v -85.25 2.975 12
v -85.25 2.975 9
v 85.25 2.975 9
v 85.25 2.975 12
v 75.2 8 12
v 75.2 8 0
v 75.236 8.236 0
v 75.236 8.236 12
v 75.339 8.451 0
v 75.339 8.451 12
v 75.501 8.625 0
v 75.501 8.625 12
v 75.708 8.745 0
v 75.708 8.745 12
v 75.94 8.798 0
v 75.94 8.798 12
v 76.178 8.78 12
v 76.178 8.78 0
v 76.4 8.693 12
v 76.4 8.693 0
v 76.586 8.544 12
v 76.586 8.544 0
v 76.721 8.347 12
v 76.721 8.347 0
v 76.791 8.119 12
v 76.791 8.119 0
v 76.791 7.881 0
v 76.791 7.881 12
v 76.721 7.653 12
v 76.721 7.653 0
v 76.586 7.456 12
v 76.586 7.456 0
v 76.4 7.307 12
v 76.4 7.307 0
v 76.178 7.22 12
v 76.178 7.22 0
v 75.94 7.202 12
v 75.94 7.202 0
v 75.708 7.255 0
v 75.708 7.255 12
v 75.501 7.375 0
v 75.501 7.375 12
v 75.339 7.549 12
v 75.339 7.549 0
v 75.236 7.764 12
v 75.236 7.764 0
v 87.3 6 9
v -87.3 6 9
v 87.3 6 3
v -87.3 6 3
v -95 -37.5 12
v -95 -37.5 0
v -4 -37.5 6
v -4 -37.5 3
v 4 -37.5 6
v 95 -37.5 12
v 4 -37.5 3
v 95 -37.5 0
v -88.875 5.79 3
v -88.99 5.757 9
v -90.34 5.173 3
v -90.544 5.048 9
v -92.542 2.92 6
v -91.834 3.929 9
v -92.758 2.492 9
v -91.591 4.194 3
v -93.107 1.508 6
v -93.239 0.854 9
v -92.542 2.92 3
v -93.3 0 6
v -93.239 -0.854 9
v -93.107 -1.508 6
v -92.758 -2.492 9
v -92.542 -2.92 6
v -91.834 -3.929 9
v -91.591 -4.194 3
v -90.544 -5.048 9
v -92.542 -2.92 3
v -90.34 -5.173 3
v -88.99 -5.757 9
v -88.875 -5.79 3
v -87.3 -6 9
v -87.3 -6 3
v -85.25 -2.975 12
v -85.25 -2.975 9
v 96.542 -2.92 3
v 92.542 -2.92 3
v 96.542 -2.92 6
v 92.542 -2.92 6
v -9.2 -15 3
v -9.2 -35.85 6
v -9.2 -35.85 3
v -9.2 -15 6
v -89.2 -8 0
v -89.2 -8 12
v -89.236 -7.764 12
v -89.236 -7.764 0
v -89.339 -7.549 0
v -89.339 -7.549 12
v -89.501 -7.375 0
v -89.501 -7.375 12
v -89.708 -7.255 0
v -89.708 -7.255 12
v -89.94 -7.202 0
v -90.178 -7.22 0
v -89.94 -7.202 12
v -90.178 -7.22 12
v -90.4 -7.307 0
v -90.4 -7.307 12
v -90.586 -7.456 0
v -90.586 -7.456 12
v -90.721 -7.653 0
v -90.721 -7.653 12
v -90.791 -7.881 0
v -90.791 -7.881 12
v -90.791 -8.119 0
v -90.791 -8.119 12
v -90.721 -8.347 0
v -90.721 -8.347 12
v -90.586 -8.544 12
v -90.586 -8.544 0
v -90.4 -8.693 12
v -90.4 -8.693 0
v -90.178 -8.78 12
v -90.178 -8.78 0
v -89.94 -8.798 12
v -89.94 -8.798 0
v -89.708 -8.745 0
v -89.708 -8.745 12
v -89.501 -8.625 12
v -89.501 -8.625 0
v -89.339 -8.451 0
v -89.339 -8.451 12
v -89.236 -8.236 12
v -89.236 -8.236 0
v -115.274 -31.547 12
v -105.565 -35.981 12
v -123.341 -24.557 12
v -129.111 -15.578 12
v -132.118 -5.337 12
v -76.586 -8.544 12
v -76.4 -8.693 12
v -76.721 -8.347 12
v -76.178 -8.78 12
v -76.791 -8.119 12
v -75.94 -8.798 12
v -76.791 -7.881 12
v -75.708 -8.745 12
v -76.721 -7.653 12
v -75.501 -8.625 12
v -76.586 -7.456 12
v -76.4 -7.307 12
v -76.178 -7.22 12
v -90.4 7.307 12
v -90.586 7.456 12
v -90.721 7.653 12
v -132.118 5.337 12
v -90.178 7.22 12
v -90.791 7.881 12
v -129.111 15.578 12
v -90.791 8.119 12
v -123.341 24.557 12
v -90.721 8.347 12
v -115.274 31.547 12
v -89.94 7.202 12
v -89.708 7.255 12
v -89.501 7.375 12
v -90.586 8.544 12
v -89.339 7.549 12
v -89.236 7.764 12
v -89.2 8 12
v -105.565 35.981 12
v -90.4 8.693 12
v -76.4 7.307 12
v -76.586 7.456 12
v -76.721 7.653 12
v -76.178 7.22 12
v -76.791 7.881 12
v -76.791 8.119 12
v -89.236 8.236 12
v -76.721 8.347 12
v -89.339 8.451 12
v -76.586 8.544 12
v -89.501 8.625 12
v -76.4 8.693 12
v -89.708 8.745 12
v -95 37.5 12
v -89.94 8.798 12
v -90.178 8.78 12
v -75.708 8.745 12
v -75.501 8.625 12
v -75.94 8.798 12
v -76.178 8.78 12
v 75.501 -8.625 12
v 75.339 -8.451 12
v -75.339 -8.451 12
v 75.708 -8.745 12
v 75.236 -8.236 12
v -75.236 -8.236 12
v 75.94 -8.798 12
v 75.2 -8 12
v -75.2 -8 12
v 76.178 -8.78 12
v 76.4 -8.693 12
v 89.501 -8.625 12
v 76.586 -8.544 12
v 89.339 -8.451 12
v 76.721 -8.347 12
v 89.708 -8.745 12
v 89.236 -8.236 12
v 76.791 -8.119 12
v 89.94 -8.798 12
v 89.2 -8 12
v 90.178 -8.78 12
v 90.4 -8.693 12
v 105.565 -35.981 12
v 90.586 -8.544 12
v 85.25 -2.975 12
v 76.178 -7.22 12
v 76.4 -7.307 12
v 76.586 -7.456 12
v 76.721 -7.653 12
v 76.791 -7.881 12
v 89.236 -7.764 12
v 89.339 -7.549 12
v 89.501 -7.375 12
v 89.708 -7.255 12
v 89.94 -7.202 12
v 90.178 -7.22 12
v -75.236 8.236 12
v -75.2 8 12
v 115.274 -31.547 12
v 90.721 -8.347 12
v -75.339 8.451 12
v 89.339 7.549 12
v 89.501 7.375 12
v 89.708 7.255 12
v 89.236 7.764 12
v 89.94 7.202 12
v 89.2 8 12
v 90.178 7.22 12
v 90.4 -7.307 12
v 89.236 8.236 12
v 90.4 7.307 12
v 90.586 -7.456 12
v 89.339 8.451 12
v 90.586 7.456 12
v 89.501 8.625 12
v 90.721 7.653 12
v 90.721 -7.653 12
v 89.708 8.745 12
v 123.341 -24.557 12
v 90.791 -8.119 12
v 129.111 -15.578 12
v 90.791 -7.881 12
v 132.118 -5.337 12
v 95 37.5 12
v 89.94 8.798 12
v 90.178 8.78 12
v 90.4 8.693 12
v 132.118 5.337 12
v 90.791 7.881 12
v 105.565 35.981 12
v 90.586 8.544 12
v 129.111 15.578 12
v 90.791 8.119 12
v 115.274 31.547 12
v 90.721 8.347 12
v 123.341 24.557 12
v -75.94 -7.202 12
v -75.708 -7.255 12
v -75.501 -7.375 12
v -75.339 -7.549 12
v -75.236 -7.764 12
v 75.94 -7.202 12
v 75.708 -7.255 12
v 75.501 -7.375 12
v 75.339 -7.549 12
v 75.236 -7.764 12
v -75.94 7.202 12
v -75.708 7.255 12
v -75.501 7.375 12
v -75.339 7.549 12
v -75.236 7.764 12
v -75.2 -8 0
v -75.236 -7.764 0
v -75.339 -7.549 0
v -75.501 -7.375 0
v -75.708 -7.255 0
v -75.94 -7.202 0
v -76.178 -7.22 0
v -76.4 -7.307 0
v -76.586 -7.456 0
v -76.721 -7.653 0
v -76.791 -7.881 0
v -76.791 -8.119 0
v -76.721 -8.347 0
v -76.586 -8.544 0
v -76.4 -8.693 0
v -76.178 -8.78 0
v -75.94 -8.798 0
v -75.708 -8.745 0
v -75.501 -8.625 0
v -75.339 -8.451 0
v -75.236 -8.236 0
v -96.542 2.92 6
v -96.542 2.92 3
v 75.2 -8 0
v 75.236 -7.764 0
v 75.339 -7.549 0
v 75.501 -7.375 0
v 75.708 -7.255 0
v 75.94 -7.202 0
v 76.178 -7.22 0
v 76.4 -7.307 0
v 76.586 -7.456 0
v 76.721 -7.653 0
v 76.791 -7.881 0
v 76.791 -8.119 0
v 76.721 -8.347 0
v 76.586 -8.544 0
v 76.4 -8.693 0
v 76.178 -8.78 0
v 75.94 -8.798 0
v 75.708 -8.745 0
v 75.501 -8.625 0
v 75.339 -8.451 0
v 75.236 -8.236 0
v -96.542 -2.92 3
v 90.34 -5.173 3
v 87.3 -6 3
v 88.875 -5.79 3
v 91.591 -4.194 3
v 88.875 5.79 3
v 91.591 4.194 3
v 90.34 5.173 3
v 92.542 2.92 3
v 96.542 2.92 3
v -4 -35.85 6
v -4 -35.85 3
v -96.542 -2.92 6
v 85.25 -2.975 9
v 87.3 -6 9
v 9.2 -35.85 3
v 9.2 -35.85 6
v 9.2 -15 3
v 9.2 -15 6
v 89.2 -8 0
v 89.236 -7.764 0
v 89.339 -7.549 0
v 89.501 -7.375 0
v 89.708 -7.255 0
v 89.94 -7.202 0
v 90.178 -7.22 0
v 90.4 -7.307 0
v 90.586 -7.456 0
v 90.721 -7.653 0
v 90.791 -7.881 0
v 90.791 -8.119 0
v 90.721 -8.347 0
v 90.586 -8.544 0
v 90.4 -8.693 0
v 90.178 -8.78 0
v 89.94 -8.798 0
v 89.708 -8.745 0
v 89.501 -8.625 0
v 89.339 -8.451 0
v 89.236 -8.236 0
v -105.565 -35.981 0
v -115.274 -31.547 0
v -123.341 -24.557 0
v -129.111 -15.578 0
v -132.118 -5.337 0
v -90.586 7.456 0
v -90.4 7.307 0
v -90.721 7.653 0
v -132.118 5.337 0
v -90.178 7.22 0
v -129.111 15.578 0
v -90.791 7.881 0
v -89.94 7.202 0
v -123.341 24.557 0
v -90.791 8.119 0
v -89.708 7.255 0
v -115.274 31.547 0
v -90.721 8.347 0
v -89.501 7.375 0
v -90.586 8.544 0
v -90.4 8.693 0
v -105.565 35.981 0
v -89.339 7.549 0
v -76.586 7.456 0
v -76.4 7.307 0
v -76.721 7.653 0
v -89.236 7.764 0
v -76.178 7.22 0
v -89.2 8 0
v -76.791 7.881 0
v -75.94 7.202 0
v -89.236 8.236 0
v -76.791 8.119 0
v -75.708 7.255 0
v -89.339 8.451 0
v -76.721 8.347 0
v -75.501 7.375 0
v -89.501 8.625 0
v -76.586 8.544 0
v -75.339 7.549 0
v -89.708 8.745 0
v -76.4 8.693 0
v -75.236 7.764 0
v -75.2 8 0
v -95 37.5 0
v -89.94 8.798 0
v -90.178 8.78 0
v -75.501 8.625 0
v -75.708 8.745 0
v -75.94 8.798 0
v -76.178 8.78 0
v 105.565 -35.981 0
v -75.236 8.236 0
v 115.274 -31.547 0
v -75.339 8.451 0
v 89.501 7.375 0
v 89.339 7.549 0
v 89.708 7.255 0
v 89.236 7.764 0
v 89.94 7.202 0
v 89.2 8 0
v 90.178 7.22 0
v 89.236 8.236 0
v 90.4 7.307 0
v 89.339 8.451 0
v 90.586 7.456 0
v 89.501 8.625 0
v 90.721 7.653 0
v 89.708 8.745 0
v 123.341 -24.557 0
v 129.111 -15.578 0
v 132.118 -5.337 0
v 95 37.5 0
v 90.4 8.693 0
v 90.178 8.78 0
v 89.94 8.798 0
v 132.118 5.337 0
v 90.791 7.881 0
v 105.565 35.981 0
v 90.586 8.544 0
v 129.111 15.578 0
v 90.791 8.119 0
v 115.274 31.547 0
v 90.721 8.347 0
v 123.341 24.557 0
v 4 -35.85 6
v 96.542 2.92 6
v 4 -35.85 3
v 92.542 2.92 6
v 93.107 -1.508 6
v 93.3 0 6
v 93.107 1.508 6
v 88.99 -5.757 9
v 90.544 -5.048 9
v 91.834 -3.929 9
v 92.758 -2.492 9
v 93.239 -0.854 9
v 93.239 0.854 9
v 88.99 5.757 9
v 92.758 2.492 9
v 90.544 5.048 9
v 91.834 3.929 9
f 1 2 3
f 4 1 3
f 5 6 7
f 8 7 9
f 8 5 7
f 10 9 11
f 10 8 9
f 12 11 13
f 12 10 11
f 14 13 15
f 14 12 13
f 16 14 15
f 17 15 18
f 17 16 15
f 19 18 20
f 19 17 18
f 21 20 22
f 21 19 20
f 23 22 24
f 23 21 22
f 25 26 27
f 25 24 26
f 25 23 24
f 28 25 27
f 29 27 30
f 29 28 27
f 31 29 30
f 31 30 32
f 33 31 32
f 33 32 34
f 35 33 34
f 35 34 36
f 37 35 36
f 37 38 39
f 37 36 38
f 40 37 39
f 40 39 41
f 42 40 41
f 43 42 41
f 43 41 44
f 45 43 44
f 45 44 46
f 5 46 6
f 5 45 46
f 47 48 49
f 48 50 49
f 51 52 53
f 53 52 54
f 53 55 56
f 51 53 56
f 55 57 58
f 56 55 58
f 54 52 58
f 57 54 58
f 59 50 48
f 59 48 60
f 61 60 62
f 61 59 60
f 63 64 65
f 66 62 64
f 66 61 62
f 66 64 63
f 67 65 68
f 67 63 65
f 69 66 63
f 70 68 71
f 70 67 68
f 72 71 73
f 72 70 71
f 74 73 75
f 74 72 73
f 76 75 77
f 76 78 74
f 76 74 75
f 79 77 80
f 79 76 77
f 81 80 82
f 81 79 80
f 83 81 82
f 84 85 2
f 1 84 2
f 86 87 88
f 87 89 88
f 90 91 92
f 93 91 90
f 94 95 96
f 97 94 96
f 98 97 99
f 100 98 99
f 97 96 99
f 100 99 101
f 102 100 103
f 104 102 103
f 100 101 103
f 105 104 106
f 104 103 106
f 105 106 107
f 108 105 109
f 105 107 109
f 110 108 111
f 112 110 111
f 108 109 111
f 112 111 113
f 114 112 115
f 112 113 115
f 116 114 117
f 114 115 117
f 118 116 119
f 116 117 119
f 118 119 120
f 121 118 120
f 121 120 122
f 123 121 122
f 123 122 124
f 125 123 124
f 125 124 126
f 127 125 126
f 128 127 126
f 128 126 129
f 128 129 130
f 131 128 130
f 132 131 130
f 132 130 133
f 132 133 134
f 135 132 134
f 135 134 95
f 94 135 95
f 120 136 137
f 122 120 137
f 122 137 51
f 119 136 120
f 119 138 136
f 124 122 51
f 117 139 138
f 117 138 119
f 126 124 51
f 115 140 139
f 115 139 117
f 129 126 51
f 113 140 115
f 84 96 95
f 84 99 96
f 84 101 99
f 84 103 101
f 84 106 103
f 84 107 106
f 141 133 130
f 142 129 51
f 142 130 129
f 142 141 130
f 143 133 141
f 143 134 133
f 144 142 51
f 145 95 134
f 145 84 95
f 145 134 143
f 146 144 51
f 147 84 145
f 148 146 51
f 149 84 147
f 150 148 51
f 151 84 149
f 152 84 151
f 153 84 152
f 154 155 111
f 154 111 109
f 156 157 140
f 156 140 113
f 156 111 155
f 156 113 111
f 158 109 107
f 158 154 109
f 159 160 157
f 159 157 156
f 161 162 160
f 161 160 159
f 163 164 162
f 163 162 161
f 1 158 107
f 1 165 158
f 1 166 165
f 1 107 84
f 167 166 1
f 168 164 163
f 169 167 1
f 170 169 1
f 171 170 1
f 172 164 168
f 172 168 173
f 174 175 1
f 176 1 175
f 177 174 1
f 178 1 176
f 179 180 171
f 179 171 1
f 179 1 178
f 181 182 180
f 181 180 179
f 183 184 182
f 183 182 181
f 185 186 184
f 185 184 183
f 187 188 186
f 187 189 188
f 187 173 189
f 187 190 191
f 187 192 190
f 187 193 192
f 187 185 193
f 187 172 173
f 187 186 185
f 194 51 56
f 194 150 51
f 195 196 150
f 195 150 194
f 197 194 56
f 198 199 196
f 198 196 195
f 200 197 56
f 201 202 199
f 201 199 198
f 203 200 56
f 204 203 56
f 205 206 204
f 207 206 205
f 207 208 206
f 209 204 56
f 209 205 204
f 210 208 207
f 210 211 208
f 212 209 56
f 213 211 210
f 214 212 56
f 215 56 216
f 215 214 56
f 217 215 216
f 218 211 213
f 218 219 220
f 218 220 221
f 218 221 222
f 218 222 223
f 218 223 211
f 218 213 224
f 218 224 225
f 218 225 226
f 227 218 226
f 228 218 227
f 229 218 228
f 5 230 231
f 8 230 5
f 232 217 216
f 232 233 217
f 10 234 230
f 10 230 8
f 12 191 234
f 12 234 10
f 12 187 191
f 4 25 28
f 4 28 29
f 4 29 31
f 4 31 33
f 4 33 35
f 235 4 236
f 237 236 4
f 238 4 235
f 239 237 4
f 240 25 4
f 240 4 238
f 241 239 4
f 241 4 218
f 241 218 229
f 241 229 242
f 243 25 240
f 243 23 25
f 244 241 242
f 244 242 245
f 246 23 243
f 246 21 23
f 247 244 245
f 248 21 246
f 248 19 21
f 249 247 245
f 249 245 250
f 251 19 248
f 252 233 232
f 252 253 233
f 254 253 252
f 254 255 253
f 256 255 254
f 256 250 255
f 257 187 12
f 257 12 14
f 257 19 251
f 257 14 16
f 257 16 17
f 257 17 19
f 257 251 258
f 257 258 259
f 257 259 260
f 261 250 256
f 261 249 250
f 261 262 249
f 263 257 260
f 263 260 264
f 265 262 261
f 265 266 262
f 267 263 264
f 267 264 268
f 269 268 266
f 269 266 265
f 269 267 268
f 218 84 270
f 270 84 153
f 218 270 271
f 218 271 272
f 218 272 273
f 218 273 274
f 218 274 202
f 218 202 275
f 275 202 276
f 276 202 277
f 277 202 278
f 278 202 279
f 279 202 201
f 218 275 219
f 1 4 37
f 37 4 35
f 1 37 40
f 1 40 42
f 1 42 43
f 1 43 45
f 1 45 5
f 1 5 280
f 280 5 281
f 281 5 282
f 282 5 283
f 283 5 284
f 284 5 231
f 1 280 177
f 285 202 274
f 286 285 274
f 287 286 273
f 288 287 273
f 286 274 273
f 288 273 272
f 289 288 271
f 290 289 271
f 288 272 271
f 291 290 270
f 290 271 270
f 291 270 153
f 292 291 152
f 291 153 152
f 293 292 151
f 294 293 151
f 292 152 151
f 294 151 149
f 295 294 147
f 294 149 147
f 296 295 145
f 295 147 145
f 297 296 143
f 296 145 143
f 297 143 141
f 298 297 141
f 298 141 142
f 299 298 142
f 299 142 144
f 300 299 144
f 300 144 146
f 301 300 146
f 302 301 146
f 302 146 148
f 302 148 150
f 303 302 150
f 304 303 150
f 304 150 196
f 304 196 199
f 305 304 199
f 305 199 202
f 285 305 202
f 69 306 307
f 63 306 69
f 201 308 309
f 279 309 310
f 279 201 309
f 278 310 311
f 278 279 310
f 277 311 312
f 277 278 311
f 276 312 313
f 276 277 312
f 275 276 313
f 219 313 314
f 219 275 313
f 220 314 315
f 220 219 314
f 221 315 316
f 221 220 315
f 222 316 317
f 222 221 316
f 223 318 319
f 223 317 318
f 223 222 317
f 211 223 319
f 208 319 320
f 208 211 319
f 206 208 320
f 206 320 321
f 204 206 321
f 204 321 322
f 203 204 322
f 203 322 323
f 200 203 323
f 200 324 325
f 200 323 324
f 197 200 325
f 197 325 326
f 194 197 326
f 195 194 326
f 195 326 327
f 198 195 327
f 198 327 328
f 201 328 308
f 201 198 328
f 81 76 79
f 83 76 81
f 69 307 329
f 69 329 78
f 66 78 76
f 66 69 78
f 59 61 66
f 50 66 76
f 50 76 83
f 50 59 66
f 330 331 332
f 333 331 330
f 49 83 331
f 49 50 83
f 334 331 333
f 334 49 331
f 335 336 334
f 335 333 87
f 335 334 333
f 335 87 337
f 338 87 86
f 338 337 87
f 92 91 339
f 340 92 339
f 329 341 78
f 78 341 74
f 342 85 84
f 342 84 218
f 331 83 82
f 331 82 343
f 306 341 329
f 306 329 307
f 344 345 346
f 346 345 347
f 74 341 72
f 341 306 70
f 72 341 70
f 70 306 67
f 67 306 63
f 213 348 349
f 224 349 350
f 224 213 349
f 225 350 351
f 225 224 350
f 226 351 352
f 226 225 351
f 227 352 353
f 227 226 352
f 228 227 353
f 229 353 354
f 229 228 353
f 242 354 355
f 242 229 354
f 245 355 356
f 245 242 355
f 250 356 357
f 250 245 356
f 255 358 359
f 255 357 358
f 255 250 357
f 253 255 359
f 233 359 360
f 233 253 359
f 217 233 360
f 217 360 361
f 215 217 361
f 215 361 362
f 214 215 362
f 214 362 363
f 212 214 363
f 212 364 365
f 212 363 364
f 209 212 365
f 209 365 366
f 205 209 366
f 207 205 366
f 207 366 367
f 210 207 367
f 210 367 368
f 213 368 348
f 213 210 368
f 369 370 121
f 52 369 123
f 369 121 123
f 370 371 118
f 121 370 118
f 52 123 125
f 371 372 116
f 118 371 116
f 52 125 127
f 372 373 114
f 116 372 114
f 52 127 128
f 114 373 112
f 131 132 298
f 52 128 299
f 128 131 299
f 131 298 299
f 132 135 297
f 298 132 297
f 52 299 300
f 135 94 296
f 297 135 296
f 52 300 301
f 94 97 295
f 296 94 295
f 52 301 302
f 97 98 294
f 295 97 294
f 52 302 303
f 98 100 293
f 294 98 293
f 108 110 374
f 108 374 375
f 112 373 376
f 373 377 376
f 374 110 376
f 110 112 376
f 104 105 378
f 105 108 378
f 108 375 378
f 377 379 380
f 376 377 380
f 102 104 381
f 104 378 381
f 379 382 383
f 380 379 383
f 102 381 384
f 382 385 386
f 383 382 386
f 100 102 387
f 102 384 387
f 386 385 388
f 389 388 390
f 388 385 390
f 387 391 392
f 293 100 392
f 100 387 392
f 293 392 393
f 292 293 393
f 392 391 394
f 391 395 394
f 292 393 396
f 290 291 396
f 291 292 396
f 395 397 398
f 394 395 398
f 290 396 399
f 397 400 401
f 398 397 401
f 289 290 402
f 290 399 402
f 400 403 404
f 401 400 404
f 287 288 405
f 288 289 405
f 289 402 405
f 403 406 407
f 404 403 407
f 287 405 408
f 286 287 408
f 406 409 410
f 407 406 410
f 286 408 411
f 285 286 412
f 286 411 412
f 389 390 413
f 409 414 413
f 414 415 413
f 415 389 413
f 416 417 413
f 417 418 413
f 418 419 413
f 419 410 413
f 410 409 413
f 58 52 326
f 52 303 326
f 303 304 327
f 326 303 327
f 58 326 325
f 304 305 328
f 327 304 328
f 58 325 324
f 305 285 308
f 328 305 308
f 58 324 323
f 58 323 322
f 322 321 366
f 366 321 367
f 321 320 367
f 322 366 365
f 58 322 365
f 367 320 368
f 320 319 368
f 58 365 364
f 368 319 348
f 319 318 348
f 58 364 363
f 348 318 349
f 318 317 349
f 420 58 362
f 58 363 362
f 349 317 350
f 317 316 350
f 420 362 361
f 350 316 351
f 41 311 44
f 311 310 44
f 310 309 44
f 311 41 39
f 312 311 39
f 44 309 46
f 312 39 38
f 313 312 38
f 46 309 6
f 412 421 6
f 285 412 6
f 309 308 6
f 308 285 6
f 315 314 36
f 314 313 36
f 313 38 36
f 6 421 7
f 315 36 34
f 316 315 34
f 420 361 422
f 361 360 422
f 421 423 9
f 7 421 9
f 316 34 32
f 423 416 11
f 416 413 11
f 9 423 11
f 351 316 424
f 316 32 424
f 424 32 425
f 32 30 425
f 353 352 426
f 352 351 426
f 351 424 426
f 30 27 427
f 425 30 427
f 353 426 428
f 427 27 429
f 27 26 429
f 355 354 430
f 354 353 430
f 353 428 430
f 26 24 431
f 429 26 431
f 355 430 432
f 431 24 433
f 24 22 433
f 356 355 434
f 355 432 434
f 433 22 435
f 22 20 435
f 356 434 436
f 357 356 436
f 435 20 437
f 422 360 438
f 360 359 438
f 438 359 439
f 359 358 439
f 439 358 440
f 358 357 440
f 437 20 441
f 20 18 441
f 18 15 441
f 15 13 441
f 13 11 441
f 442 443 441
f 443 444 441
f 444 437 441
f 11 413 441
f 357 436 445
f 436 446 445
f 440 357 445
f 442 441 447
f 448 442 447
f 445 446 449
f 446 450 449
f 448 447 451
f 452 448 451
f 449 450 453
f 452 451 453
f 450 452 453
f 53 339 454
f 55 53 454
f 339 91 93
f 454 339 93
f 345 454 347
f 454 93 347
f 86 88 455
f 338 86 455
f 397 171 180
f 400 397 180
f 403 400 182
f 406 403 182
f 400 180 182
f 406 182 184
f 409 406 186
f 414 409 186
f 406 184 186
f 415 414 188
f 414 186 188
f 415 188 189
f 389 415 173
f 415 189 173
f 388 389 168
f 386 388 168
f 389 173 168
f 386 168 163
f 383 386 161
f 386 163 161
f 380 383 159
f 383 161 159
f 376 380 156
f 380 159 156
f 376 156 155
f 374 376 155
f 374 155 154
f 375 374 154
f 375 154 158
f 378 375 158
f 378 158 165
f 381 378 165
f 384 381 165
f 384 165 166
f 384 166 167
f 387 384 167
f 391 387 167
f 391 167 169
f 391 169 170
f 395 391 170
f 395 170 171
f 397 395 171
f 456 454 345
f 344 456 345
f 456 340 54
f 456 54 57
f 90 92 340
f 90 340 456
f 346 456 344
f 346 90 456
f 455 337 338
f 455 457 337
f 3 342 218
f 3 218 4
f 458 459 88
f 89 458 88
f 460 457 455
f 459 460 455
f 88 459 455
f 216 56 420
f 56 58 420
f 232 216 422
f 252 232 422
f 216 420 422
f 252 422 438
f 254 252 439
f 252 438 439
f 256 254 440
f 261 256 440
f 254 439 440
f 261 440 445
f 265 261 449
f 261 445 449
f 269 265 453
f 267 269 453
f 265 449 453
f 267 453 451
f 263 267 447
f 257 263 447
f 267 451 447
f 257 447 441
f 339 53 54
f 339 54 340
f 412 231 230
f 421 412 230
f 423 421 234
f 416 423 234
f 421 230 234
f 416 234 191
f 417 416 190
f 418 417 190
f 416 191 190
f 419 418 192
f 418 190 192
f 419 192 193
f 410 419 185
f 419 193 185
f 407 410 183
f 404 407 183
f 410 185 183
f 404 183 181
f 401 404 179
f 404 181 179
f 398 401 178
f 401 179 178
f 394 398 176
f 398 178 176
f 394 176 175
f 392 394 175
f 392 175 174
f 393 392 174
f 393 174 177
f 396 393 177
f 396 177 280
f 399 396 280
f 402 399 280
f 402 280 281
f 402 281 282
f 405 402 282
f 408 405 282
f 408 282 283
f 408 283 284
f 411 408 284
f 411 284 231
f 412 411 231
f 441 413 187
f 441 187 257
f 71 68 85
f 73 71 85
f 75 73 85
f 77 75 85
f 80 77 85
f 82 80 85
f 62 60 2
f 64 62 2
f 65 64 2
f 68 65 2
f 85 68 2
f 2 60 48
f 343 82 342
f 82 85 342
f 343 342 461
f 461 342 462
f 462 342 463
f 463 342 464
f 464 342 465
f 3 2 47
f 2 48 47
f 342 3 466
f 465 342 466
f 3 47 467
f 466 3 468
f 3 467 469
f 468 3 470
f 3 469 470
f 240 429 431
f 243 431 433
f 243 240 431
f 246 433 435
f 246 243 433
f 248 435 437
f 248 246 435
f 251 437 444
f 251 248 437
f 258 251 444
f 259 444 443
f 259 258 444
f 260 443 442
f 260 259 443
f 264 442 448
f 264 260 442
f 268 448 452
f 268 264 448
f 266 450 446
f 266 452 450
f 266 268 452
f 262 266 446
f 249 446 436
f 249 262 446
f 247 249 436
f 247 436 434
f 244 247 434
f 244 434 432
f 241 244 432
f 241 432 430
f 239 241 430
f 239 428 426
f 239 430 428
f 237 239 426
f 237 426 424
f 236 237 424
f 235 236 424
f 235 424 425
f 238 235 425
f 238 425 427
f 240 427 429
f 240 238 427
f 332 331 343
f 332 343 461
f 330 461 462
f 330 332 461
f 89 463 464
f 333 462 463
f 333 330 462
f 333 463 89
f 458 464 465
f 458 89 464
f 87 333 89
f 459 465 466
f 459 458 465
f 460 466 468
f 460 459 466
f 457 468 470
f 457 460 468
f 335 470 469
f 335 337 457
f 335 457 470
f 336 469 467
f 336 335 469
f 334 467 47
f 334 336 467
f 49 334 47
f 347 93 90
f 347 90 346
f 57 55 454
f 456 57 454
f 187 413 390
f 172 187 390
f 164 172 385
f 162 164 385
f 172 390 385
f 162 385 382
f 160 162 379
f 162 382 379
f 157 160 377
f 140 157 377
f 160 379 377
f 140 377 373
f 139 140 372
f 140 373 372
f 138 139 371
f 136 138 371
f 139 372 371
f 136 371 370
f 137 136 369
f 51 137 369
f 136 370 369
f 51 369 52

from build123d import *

# Parameters (mm, degrees)
PAD_DEPTH       = 6
POCKET_DEPTH    = 3
SKETCH002_W     = 18.4
SKETCH002_H     = 20.85
POCKET001_DEPTH = 3
SKETCH003_W     = 8
SKETCH003_H     = 1.65
POCKET002_DEPTH = 3
PAD001_DEPTH    = 3
SKETCH005_W     = 170.5
SKETCH005_H     = 5.95
PAD002_DEPTH    = 3
SKETCH007_R     = 0.8
POCKET003_DEPTH = 563.341185
SKETCH008_W     = 4
SKETCH008_H     = 5.84
POCKET004_DEPTH = 3


with BuildPart() as part:
    # Sketch → Pad (new body)
    with BuildSketch(Plane.XY):
        with BuildLine():
            ThreePointArc((-95, 37.5), (-132.5, 0), (-95, -37.5))
            Line((-95, -37.5), (95, -37.5))
            ThreePointArc((95, -37.5), (132.5, 0), (95, 37.5))
            Line((-95, 37.5), (95, 37.5))
        make_face()
    extrude(amount=PAD_DEPTH)

    # Sketch001 (on Face6 of Pad) → Pocket (cut)
    with BuildSketch(Plane.XY.offset(6)):
        with BuildLine():
            ThreePointArc((-87.3, 6), (-93.3, 0), (-87.3, -6))
            Line((-87.3, -6), (87.3, -6))
            ThreePointArc((87.3, -6), (93.3, 0), (87.3, 6))
            Line((-87.3, 6), (87.3, 6))
        make_face()
    extrude(amount=-POCKET_DEPTH, mode=Mode.SUBTRACT)

    # Sketch002 (on Face5 of Pocket) → Pocket001 (cut)
    with BuildSketch(Plane.XY.offset(6)):
        with Locations((0, -25.425)):
            Rectangle(SKETCH002_W, SKETCH002_H)
    extrude(amount=-POCKET001_DEPTH, mode=Mode.SUBTRACT)

    # Sketch003 (on Face5 of Pocket001) → Pocket002 (cut)
    with BuildSketch(Plane.XY.offset(6)):
        with Locations((0, -36.675)):
            Rectangle(SKETCH003_W, SKETCH003_H)
    extrude(amount=-POCKET002_DEPTH, mode=Mode.SUBTRACT)

    # Sketch004 (on Face5 of Pocket002) → Pad001 (join)
    with BuildSketch(Plane.XY.offset(6)):
        with BuildLine():
            ThreePointArc((-95, 37.5), (-132.5, 0), (-95, -37.5))
            Line((-95, -37.5), (95, -37.5))
            ThreePointArc((95, -37.5), (132.5, 0), (95, 37.5))
            Line((-95, 37.5), (95, 37.5))
        make_face()
        with BuildLine():
            ThreePointArc((-87.3, 6), (-93.3, 0), (-87.3, -6))
            Line((-87.3, -6), (87.3, -6))
            ThreePointArc((87.3, -6), (93.3, 0), (87.3, 6))
            Line((-87.3, 6), (87.3, 6))
        make_face(mode=Mode.SUBTRACT)
    extrude(amount=PAD001_DEPTH)

    # Sketch005 (on Face12 of Pad001) → Pad002 (join)
    with BuildSketch(Plane.XY.offset(9)):
        with BuildLine():
            ThreePointArc((-95, 37.5), (-132.5, 0), (-95, -37.5))
            Line((-95, -37.5), (95, -37.5))
            ThreePointArc((95, -37.5), (132.5, 0), (95, 37.5))
            Line((-95, 37.5), (95, 37.5))
        make_face()
        Rectangle(SKETCH005_W, SKETCH005_H, mode=Mode.SUBTRACT)
    extrude(amount=PAD002_DEPTH)

    # Sketch007 (on Face20 of Pad002) → Pocket003 (cut, through all)
    with BuildSketch(Plane.XY.offset(12)):
        with Locations((-90, -8)):
            Circle(SKETCH007_R)
        with Locations((-90, 8)):
            Circle(SKETCH007_R)
        with Locations((-76, 8)):
            Circle(SKETCH007_R)
        with Locations((-76, -8)):
            Circle(SKETCH007_R)
    pocket003 = extrude(amount=-POCKET003_DEPTH, mode=Mode.SUBTRACT)

    # Mirrored: Pocket003 across Sketch007 V_Axis
    add(pocket003.mirror(Plane(origin=(0, 0, 12), x_dir=(0, 0, 1), z_dir=(1, 0, 0))), mode=Mode.SUBTRACT)

    # Sketch008 (on Face5 of Pocket) → Pocket004 (cut)
    with BuildSketch(Plane.XY.offset(6)):
        with Locations((-94.541526, 0)):
            Rectangle(SKETCH008_W, SKETCH008_H)
        with Locations((94.541526, 0)):
            Rectangle(SKETCH008_W, SKETCH008_H)
    extrude(amount=-POCKET004_DEPTH, mode=Mode.SUBTRACT)


solid = part.part
